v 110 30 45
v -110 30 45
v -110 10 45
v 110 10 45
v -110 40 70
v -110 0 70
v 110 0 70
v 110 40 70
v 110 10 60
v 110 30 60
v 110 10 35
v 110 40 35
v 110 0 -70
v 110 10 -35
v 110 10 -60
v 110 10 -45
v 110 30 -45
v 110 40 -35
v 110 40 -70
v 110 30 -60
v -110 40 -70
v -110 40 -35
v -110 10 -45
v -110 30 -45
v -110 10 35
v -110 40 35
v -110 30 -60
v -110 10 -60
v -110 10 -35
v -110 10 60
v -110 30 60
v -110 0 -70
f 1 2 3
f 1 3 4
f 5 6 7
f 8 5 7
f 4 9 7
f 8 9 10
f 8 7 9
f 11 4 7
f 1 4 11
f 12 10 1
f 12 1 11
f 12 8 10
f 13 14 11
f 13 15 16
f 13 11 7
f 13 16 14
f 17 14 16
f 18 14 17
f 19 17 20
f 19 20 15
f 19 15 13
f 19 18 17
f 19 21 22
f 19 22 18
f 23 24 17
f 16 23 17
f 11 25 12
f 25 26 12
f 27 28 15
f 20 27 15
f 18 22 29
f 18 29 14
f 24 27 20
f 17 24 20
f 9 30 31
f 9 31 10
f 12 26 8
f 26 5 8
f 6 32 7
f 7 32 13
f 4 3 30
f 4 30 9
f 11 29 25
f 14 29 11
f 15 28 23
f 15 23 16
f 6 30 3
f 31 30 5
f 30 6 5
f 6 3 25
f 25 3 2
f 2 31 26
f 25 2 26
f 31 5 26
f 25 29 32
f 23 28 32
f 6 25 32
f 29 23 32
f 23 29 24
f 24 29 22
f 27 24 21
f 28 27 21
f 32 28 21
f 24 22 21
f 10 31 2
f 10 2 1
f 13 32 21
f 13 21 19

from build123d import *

# Parameters (mm, degrees)
SKETCH1_W           = 220
SKETCH1_H           = 140
BOSS_EXTRUDE1_DEPTH = 10
SKETCH2_W           = 220
SKETCH2_H           = 10
BOSS_EXTRUDE2_DEPTH = 30
SKETCH3_W           = 220
SKETCH3_H           = 10
BOSS_EXTRUDE3_DEPTH = 25
SKETCH4_W           = 220
SKETCH4_H           = 10
BOSS_EXTRUDE4_DEPTH = 20


with BuildPart() as part:
    # Sketch1 → Boss-Extrude1 (new body)
    with BuildSketch(Plane(origin=(0, 0, 0), x_dir=(1, 0, 0), z_dir=(0, 1, 0))):
        Rectangle(SKETCH1_W, SKETCH1_H)
    extrude(amount=BOSS_EXTRUDE1_DEPTH)

    # Sketch2 → Boss-Extrude2 (add)
    with BuildSketch(Plane(origin=(0, 10, 0), x_dir=(1, 0, 0), z_dir=(0, 1, 0))):
        with Locations((0, 65)):
            Rectangle(SKETCH2_W, SKETCH2_H)
        with Locations((0, -65)):
            Rectangle(SKETCH2_W, SKETCH2_H)
    extrude(amount=BOSS_EXTRUDE2_DEPTH)

    # Sketch3 → Boss-Extrude3 (add)
    with BuildSketch(Plane.XY.offset(-60)):
        with Locations((0, 35)):
            Rectangle(SKETCH3_W, SKETCH3_H)
    boss_extrude3 = extrude(amount=BOSS_EXTRUDE3_DEPTH)

    # Mirror1: Boss-Extrude3 across plane
    add(boss_extrude3.mirror(Plane.XY))

    # Sketch4 → Boss-Extrude4 (add)
    with BuildSketch(Plane.XZ.offset(-30)):
        with Locations((0, -40)):
            Rectangle(SKETCH4_W, SKETCH4_H)
    boss_extrude4 = extrude(amount=BOSS_EXTRUDE4_DEPTH)

    # Mirror2: Boss-Extrude4 across plane
    add(boss_extrude4.mirror(Plane.XY))


solid = part.part
